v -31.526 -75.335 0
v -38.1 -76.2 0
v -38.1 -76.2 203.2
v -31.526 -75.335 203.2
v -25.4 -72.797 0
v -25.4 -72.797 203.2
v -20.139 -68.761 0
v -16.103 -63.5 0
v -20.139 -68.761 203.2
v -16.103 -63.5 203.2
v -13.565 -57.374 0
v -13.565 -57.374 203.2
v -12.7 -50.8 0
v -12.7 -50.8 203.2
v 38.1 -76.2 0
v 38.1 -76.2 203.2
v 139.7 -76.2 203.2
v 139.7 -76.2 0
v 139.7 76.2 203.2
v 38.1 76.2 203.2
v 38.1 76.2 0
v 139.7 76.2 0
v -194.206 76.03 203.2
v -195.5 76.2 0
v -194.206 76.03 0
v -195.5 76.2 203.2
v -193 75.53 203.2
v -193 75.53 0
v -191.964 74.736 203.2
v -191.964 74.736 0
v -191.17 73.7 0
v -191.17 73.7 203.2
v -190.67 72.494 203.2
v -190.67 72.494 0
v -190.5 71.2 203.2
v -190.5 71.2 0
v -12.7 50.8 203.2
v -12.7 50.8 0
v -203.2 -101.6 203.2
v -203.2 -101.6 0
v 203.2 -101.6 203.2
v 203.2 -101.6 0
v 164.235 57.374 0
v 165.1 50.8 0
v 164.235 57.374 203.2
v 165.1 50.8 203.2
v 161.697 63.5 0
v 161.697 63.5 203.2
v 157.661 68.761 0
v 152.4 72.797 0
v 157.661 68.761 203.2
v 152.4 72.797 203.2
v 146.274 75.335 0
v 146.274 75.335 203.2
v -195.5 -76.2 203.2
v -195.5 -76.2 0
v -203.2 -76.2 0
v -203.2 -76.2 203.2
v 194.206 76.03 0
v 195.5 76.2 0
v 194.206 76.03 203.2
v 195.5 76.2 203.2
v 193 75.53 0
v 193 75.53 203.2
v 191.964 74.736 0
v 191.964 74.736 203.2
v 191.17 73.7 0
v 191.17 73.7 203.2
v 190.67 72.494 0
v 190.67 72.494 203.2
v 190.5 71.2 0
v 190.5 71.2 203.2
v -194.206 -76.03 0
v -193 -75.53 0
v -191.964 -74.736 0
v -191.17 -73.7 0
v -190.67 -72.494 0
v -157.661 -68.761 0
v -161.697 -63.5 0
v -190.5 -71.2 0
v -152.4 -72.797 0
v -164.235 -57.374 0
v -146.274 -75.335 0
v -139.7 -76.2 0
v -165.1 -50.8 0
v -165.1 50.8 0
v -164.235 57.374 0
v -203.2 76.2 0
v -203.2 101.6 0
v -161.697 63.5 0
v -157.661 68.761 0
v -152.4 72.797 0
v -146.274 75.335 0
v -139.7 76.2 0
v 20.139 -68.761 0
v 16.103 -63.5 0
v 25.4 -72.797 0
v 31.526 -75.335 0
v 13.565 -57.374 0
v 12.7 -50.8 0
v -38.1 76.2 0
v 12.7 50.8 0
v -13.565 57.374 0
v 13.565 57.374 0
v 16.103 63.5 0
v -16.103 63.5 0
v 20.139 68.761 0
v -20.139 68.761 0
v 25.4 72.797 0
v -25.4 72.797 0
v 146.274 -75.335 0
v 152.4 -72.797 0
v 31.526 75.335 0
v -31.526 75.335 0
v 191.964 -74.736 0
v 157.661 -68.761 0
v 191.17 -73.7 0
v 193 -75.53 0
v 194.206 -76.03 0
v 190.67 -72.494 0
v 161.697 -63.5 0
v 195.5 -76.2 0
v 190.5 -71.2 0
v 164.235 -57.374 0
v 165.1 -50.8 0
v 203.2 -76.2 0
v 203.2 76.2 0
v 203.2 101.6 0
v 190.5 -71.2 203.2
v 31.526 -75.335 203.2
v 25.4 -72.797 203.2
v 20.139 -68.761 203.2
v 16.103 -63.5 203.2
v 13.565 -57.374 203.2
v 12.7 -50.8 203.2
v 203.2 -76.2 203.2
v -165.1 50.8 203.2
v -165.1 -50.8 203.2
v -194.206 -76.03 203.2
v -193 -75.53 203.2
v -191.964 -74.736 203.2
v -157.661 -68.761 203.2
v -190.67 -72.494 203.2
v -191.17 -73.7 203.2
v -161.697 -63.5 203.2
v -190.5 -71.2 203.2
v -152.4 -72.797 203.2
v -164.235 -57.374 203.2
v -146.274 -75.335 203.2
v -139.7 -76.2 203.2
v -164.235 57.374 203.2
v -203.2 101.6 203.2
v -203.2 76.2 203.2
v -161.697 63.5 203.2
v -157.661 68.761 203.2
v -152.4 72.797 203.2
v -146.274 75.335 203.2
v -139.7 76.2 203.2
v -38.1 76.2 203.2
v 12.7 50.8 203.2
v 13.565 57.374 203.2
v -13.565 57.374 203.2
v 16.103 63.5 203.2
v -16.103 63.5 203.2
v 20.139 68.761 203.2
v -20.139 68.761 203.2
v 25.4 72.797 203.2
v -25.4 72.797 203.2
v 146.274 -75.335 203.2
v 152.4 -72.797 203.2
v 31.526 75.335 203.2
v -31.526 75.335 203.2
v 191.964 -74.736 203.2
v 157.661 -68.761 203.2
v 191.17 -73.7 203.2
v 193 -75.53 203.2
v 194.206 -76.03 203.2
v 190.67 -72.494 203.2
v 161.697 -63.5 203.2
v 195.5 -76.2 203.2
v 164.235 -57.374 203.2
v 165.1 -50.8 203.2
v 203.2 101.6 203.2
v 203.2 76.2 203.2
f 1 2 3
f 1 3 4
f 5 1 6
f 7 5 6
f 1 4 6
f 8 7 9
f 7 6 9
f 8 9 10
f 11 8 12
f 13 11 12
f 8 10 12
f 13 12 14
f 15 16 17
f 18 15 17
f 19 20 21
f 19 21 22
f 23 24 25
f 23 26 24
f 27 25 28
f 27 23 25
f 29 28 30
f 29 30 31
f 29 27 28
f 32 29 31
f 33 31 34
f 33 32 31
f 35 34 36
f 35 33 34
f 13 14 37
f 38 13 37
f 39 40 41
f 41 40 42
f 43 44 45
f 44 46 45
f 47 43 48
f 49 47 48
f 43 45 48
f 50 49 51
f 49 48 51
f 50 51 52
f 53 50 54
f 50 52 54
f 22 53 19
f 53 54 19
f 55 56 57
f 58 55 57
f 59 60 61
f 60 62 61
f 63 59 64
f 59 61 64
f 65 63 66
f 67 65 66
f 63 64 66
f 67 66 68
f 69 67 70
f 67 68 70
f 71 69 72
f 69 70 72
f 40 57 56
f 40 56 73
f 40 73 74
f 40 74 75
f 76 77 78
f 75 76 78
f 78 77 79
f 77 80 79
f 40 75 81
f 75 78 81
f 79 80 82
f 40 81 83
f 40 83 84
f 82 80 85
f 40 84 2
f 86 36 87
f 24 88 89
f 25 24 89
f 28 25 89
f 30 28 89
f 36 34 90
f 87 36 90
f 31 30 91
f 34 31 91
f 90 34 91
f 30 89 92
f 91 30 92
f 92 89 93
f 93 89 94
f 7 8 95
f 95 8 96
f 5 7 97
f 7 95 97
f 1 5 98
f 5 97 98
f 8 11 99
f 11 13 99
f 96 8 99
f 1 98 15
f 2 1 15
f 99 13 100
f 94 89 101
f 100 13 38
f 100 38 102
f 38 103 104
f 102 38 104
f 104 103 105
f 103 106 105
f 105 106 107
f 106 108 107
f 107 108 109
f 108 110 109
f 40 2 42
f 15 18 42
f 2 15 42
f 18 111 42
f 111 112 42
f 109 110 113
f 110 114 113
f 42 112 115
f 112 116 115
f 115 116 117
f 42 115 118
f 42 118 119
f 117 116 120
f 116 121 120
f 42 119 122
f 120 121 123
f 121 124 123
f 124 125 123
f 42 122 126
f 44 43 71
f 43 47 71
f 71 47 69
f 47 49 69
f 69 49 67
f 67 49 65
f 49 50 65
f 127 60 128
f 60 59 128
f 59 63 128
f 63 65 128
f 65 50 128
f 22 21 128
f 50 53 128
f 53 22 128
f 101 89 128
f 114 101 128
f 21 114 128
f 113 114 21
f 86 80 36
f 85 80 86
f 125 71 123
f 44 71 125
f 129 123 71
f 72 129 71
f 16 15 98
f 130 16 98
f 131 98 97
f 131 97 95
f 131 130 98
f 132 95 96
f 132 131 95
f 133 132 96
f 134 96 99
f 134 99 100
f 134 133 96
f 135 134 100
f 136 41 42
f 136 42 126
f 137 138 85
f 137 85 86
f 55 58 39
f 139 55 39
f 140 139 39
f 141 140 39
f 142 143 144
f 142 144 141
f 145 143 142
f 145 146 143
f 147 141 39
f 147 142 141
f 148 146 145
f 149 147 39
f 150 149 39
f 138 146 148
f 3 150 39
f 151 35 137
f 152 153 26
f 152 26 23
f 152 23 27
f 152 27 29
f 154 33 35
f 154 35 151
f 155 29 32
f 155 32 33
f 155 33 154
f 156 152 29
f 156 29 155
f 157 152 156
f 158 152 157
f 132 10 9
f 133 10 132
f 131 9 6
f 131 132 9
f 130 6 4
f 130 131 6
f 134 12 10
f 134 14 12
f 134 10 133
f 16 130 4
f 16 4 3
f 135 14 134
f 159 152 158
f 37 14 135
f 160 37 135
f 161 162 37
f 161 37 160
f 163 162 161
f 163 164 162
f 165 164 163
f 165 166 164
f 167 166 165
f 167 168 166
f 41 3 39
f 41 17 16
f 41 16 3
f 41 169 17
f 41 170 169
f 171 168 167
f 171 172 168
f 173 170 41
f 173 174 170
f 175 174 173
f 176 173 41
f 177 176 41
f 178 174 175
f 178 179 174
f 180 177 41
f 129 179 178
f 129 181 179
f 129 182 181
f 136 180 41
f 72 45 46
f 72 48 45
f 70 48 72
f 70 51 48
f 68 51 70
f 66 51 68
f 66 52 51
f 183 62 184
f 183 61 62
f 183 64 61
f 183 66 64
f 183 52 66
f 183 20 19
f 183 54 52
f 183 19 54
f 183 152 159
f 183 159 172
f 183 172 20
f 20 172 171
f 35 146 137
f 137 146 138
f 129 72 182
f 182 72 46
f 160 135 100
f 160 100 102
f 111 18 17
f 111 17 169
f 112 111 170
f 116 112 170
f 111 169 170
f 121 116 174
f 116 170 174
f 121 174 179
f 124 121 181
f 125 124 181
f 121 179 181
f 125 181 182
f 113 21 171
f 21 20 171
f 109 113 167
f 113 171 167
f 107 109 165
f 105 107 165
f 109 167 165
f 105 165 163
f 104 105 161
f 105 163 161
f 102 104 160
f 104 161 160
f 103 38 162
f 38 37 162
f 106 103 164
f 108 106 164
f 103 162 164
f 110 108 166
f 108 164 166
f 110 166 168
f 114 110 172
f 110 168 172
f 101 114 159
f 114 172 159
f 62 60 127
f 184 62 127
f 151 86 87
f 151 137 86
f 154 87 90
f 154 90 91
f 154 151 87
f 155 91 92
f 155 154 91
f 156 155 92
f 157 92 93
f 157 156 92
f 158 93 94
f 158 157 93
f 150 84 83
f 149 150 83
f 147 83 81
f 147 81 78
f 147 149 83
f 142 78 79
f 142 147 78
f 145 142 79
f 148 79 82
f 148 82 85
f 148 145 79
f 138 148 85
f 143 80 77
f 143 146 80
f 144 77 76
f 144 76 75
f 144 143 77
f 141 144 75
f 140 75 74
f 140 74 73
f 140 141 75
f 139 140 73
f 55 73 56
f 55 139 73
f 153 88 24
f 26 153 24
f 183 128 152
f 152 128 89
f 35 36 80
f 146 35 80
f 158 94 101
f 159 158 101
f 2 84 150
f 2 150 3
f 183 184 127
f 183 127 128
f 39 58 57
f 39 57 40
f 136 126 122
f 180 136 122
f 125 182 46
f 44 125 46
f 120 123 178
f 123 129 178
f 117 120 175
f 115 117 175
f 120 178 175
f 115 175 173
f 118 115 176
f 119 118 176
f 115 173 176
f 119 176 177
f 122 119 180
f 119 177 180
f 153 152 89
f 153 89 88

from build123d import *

# Parameters (mm, degrees)
F0_W     = 152.4
F0_H     = 152.4
F1_DEPTH = 203.2
F2_R     = 25.4
F3_R     = 5


with BuildPart() as f1:
    # F0 (on Top) → F1 (new body)
    with BuildSketch(Plane.XY):
        Polygon((203.2, 101.6), (-203.2, 101.6), (-203.2, 76.2), (-190.5, 76.2), (-190.5, -76.2), (-203.2, -76.2), (-203.2, -101.6), (203.2, -101.6), (203.2, -76.2), (190.5, -76.2), (190.5, 76.2), (203.2, 76.2), align=None)
        with Locations((-88.9, 0)):
            Rectangle(F0_W, F0_H, mode=Mode.SUBTRACT)
        with Locations((88.9, 0)):
            Rectangle(F0_W, F0_H, mode=Mode.SUBTRACT)
    extrude(amount=F1_DEPTH)

    # F2
    f2_edges = [f1.edges().sort_by_distance(p)[0] for p in [
        (-165.1, 76.2, 101.6),
        (-165.1, -76.2, 101.6),
        (12.7, -76.2, 101.6),
        (12.7, 76.2, 101.6),
        (165.1, 76.2, 101.6),
        (165.1, -76.2, 101.6),
        (-12.7, 76.2, 101.6),
        (-12.7, -76.2, 101.6),
    ]]
    fillet(f2_edges, radius=F2_R)

    # F3
    f3_edges = [f1.edges().sort_by_distance(p)[0] for p in [
        (-190.5, 76.2, 101.6),
        (-190.5, -76.2, 101.6),
        (190.5, 76.2, 101.6),
        (190.5, -76.2, 101.6),
    ]]
    fillet(f3_edges, radius=F3_R)


solid = f1.part
